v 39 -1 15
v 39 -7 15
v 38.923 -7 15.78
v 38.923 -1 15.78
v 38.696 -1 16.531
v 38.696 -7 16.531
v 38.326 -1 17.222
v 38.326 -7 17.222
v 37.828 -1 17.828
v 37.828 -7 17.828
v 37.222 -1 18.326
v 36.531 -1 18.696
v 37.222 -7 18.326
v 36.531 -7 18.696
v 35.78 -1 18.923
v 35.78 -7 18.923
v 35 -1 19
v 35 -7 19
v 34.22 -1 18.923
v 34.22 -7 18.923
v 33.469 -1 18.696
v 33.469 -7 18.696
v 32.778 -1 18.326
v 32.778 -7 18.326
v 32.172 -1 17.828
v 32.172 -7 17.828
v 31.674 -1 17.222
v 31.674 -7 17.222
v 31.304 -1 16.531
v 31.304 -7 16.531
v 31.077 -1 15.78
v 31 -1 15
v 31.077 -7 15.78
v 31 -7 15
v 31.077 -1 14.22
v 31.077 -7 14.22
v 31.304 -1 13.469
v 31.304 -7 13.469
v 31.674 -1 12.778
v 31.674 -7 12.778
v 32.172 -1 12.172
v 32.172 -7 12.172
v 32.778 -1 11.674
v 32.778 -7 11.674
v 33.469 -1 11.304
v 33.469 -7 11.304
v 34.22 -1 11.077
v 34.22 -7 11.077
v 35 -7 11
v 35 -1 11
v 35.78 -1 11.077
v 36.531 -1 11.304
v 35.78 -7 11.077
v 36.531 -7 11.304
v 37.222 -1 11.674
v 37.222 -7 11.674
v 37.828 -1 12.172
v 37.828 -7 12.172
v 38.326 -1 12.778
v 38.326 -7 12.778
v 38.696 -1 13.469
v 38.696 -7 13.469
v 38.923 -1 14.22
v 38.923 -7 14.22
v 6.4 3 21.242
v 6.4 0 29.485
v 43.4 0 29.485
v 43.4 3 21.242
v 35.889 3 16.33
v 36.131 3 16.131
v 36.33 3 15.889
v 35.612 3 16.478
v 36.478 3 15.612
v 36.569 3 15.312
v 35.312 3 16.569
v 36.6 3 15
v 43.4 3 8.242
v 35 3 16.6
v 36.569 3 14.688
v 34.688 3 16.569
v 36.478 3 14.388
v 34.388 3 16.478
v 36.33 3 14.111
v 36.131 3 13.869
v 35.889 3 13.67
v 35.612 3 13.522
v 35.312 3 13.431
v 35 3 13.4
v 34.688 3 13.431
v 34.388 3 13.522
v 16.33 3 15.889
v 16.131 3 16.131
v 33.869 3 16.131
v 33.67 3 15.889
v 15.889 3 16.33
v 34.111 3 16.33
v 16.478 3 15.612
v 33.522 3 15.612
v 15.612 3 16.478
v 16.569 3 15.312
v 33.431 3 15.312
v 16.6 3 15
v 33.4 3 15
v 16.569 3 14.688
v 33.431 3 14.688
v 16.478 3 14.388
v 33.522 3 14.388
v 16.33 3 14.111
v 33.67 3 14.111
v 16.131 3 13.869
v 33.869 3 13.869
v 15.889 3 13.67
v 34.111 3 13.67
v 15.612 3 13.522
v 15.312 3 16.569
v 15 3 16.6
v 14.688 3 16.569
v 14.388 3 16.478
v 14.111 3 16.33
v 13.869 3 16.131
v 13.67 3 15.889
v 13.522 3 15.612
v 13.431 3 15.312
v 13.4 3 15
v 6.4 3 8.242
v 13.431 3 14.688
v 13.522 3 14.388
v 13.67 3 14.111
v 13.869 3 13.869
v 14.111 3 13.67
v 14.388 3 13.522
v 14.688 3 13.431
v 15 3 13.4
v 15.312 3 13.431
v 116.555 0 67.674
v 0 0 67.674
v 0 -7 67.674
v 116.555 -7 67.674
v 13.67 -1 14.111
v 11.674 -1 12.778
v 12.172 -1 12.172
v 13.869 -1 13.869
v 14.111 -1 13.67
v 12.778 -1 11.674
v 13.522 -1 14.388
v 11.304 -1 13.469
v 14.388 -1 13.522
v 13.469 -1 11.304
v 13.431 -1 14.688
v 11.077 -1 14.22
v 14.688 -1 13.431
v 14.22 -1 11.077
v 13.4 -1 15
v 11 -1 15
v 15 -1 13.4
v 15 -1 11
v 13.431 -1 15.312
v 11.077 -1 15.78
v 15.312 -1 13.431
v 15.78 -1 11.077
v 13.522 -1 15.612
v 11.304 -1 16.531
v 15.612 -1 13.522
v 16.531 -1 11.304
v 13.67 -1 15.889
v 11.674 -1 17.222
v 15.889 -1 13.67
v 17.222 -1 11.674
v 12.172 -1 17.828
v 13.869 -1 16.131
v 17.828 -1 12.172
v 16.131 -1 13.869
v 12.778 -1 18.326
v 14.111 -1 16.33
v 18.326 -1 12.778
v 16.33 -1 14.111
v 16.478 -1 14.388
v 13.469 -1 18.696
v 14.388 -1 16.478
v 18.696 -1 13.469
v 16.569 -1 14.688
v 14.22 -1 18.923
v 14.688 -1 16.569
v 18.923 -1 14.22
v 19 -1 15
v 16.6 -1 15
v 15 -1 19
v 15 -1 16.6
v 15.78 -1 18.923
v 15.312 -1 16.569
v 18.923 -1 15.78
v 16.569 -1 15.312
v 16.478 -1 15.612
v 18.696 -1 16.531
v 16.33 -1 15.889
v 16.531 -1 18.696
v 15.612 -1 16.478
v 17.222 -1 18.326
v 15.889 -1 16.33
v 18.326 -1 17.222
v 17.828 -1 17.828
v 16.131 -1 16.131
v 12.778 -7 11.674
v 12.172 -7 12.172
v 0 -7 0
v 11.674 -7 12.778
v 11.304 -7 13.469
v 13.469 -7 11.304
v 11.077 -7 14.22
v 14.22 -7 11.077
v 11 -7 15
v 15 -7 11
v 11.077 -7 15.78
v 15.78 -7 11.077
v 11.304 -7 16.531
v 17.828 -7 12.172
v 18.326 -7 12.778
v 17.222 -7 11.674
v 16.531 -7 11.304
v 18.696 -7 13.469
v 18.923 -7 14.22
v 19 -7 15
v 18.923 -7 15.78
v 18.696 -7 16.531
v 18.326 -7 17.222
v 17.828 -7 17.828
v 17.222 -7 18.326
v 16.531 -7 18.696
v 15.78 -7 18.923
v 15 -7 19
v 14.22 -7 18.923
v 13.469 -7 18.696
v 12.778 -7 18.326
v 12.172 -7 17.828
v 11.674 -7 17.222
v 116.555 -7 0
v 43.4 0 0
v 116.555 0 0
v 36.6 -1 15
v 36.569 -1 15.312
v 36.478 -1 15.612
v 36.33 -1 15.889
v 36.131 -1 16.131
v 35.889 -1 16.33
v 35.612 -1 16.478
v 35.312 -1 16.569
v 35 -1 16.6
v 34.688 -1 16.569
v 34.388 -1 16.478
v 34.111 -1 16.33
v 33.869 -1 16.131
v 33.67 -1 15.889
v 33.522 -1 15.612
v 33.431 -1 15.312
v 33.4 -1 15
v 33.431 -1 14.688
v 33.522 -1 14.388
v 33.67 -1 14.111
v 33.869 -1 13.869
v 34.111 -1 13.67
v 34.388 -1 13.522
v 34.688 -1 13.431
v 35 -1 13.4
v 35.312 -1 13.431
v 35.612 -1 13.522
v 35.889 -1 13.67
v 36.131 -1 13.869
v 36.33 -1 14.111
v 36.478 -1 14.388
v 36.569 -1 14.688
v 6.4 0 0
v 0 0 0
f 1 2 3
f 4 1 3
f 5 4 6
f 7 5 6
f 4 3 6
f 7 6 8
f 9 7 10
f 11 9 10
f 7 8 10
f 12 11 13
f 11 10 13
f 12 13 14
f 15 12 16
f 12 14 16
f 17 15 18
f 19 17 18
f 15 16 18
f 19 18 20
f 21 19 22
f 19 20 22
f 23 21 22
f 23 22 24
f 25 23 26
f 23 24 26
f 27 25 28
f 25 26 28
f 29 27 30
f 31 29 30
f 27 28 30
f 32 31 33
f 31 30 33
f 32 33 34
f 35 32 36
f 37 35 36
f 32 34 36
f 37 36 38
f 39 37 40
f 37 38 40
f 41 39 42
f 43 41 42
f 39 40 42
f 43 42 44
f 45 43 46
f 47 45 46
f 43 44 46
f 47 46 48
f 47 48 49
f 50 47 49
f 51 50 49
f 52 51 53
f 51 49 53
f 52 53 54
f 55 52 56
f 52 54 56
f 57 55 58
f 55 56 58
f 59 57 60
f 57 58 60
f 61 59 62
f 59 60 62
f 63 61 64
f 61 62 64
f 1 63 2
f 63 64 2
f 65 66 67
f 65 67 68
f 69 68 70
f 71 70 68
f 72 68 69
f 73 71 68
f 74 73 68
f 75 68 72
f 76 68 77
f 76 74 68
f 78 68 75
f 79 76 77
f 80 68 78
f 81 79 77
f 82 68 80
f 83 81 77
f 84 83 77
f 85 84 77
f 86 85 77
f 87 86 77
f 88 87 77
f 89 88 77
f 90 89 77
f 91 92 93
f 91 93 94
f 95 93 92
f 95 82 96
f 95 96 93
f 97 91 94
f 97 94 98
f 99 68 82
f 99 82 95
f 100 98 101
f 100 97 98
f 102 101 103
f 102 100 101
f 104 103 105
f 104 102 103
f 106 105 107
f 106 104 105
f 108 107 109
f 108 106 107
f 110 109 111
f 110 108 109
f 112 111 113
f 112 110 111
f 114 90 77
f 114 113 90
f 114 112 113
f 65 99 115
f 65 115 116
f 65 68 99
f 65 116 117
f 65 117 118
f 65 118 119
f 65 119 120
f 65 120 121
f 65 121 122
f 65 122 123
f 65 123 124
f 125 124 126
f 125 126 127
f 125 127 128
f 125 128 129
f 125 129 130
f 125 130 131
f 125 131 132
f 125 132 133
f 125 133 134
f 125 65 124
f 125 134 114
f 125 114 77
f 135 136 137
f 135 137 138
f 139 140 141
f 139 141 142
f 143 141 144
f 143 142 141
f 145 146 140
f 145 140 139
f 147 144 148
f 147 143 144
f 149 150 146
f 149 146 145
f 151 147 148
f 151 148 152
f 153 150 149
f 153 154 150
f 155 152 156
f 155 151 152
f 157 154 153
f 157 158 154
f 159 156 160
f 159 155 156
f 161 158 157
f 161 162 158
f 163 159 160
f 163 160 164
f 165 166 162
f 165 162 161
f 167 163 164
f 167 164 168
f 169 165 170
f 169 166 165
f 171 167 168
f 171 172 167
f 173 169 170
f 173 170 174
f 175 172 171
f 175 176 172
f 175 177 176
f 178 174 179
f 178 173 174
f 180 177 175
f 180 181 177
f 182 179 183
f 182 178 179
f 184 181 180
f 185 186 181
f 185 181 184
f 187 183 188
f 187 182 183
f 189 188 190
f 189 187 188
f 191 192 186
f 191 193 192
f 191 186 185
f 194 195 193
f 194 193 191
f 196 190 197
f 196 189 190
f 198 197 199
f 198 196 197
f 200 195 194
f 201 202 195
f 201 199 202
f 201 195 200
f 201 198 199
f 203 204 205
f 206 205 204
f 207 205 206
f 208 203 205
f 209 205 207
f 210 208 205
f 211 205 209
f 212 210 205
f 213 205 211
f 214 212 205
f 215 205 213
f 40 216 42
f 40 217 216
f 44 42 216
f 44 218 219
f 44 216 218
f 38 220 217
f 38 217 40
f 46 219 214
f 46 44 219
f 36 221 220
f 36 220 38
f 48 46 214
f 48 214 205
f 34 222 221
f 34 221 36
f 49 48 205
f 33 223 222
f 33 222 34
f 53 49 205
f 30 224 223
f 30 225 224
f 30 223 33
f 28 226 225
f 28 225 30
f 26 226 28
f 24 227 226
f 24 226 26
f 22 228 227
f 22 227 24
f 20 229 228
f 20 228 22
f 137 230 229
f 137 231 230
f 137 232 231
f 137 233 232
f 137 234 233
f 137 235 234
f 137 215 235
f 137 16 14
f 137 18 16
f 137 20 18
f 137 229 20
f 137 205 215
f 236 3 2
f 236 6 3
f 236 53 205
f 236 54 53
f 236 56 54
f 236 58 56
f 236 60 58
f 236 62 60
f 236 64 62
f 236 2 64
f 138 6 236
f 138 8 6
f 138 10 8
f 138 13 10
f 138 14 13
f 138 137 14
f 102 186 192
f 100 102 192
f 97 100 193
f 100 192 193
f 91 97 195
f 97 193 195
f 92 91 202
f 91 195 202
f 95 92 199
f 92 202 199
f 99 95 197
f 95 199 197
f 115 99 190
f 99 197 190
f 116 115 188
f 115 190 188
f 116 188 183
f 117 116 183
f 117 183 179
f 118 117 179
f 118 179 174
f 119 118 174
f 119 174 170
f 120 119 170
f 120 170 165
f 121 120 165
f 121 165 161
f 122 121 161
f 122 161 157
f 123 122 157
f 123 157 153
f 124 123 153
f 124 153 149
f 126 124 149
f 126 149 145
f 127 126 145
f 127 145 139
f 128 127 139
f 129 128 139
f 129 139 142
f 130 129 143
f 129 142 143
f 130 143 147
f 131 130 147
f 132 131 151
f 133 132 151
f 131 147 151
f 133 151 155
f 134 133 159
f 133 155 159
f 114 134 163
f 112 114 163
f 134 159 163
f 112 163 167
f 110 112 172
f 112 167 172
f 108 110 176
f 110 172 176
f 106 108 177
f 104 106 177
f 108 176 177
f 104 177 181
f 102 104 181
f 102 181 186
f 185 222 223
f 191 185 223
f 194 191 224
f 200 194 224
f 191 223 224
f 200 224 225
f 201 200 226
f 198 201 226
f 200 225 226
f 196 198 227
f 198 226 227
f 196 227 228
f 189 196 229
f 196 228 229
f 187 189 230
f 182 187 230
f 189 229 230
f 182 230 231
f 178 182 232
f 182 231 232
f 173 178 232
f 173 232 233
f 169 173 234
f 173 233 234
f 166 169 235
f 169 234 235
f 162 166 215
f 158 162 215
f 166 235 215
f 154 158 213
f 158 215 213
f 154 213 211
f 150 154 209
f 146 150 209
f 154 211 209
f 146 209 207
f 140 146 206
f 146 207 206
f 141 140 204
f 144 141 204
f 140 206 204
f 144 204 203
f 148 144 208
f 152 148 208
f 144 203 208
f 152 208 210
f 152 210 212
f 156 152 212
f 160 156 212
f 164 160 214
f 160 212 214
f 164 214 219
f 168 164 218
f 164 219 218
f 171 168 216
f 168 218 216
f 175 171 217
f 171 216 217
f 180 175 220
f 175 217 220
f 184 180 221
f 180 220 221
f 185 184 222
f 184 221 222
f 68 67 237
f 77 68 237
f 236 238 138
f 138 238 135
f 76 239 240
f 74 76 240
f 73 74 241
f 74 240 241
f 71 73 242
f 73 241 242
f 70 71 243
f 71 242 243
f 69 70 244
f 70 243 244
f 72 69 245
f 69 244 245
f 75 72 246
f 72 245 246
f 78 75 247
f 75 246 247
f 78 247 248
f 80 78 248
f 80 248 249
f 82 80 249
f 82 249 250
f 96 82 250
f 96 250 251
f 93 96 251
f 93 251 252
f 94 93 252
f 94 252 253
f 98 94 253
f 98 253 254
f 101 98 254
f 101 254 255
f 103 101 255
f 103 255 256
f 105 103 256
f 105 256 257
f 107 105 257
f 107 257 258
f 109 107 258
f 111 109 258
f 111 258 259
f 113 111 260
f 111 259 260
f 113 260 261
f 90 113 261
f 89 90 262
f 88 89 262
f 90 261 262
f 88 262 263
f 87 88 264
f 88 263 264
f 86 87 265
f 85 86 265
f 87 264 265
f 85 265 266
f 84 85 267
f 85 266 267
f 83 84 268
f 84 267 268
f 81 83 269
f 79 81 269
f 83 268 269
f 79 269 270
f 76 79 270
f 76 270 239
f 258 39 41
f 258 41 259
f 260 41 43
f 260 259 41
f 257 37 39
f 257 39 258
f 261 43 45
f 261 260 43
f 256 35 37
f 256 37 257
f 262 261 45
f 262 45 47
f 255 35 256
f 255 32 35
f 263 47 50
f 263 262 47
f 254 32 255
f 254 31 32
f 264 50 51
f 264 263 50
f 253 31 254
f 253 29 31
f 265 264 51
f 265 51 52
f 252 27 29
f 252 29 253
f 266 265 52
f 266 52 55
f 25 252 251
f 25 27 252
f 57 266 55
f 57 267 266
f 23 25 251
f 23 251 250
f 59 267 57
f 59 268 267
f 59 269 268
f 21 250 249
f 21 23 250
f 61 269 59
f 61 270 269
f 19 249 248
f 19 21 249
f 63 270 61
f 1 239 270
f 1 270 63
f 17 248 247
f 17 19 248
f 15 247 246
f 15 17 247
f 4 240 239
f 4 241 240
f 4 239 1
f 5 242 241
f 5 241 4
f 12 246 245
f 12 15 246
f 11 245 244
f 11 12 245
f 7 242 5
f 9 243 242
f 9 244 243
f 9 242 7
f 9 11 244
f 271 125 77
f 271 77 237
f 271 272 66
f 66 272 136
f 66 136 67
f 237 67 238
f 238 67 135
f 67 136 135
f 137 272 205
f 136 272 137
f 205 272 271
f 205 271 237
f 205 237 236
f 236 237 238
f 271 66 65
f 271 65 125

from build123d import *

# Parameters (mm, degrees)
F0_W     = 116.5554597974
F0_H     = 67.673869431
F1_DEPTH = 7
F4_START = -6.4
F4_DEPTH = 37
F2_R     = 1.6
F5_DEPTH = 10.001
F2_R_2   = 4
F6_DEPTH = 6


with BuildPart() as f1:
    # F0 (on Front) → F1 (new body)
    with BuildSketch(Plane.XZ):
        with Locations((58.2777298987, 33.8369347155)):
            Rectangle(F0_W, F0_H)
    extrude(amount=F1_DEPTH)

    # F3 (on face) → F4 (join)
    with BuildSketch(Plane(origin=(0, 0, 0), x_dir=(0, -1, 0), z_dir=(-1, 0, 0)).offset(F4_START)):
        Polygon((-3, 8.2424322584), (0, 0), (0, 29.4848645167), (-3, 21.2424322584), align=None)
    extrude(amount=-F4_DEPTH)

    # F2 (on face) → F5 (cut, through all)
    with BuildSketch(Plane.XZ.offset(7)):
        with Locations((15, 15)):
            Circle(F2_R)
        with Locations((35, 15)):
            Circle(F2_R)
    extrude(amount=-F5_DEPTH, mode=Mode.SUBTRACT)

    # F2 (on face) → F6 (cut)
    with BuildSketch(Plane.XZ.offset(7)):
        with Locations((15, 15)):
            Circle(F2_R_2)
        with Locations((15, 15)):
            Circle(F2_R, mode=Mode.SUBTRACT)
        with Locations((35, 15)):
            Circle(F2_R_2)
        with Locations((35, 15)):
            Circle(F2_R, mode=Mode.SUBTRACT)
    extrude(amount=-F6_DEPTH, mode=Mode.SUBTRACT)


solid = f1.part
